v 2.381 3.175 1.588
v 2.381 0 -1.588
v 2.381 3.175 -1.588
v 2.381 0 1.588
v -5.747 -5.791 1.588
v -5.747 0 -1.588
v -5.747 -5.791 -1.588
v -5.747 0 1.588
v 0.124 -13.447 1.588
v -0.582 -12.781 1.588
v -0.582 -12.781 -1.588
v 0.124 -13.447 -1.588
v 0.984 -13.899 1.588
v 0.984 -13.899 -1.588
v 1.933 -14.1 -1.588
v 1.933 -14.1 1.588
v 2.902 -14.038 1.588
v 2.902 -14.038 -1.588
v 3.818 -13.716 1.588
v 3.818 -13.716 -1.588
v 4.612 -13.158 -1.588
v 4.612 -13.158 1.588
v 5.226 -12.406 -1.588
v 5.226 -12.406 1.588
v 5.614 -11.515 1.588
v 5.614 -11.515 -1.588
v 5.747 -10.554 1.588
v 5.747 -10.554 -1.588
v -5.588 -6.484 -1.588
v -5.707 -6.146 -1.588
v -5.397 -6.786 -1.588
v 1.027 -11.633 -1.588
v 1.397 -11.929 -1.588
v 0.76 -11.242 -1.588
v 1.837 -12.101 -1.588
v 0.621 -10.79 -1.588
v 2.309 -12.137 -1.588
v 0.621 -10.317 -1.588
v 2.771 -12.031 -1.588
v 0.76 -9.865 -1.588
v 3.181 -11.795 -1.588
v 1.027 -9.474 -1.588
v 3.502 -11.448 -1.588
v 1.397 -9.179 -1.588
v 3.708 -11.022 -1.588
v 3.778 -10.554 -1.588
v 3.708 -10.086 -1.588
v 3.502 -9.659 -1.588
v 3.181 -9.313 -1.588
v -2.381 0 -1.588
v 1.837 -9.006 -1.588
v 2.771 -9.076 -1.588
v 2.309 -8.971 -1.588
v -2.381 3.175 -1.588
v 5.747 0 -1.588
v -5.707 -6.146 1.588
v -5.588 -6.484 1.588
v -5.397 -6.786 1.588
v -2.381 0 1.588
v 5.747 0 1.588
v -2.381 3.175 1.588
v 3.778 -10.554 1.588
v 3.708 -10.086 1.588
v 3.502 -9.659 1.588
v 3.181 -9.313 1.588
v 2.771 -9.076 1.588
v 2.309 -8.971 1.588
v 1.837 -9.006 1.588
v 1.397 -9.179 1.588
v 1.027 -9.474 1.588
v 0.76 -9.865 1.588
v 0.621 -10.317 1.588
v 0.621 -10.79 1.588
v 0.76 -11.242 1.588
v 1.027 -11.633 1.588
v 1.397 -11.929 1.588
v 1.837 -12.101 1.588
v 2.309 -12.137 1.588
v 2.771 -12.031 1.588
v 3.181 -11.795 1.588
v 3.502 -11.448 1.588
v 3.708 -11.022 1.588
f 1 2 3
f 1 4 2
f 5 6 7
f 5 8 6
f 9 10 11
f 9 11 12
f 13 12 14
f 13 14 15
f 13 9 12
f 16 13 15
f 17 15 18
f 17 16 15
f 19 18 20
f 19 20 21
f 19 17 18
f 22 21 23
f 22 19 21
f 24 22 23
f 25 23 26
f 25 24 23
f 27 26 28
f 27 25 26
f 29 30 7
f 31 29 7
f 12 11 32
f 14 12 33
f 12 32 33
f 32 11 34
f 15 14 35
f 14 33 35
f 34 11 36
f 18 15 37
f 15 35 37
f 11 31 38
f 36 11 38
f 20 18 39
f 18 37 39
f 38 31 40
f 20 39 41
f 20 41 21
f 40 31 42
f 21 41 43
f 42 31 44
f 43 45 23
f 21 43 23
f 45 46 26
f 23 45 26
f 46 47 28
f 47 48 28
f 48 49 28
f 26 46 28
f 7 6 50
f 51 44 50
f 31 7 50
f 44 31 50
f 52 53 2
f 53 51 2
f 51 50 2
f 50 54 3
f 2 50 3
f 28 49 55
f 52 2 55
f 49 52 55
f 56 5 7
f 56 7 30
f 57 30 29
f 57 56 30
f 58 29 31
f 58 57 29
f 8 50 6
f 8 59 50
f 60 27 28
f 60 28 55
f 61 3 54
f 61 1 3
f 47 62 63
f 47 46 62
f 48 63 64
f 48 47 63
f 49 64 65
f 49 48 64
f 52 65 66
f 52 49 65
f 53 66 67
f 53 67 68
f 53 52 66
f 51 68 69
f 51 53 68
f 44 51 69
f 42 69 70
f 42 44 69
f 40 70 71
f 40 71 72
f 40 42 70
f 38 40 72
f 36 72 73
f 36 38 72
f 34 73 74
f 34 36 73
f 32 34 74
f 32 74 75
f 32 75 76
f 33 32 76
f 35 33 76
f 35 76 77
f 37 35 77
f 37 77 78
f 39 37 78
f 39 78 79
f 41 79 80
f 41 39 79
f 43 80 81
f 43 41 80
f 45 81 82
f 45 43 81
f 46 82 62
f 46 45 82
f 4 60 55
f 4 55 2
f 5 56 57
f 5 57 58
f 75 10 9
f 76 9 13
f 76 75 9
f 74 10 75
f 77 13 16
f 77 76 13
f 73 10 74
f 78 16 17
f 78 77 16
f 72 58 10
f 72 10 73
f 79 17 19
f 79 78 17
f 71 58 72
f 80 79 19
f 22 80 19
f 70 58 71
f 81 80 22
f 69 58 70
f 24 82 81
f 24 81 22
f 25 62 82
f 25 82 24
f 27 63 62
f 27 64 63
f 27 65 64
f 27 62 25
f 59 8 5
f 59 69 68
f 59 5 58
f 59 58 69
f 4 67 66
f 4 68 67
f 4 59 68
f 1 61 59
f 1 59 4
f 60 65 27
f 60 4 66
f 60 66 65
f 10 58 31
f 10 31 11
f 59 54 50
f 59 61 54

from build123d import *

# Parameters (mm, degrees)
SKETCH1_R           = 1.5875
BOSS_EXTRUDE1_DEPTH = 1.5875


with BuildPart() as part:
    # Sketch1 → Boss-Extrude1 (new body, symmetric)
    with BuildSketch(Plane.XY):
        with BuildLine():
            Line((-5.74675, 0), (-5.74675, -5.791392014))
            ThreePointArc((-5.74675, -5.791392014), (-5.65674567, -6.318329362), (-5.396938386, -6.785516609))
            Line((-5.396938386, -6.785516609), (-0.581671984, -12.780539093))
            ThreePointArc((-0.581671984, -12.780539093), (3.37108966, -13.9080903), (5.74675, -10.5537))
            Line((5.74675, -10.5537), (5.74675, 0))
            Line((5.74675, 0), (2.38125, 0))
            Line((2.38125, 0), (2.38125, 3.175))
            Line((2.38125, 3.175), (-2.38125, 3.175))
            Line((-2.38125, 3.175), (-2.38125, 0))
            Line((-2.38125, 0), (-5.74675, 0))
        make_face()
        with Locations((2.19075, -10.5537)):
            Circle(SKETCH1_R, mode=Mode.SUBTRACT)
    extrude(amount=BOSS_EXTRUDE1_DEPTH, both=True)


solid = part.part
